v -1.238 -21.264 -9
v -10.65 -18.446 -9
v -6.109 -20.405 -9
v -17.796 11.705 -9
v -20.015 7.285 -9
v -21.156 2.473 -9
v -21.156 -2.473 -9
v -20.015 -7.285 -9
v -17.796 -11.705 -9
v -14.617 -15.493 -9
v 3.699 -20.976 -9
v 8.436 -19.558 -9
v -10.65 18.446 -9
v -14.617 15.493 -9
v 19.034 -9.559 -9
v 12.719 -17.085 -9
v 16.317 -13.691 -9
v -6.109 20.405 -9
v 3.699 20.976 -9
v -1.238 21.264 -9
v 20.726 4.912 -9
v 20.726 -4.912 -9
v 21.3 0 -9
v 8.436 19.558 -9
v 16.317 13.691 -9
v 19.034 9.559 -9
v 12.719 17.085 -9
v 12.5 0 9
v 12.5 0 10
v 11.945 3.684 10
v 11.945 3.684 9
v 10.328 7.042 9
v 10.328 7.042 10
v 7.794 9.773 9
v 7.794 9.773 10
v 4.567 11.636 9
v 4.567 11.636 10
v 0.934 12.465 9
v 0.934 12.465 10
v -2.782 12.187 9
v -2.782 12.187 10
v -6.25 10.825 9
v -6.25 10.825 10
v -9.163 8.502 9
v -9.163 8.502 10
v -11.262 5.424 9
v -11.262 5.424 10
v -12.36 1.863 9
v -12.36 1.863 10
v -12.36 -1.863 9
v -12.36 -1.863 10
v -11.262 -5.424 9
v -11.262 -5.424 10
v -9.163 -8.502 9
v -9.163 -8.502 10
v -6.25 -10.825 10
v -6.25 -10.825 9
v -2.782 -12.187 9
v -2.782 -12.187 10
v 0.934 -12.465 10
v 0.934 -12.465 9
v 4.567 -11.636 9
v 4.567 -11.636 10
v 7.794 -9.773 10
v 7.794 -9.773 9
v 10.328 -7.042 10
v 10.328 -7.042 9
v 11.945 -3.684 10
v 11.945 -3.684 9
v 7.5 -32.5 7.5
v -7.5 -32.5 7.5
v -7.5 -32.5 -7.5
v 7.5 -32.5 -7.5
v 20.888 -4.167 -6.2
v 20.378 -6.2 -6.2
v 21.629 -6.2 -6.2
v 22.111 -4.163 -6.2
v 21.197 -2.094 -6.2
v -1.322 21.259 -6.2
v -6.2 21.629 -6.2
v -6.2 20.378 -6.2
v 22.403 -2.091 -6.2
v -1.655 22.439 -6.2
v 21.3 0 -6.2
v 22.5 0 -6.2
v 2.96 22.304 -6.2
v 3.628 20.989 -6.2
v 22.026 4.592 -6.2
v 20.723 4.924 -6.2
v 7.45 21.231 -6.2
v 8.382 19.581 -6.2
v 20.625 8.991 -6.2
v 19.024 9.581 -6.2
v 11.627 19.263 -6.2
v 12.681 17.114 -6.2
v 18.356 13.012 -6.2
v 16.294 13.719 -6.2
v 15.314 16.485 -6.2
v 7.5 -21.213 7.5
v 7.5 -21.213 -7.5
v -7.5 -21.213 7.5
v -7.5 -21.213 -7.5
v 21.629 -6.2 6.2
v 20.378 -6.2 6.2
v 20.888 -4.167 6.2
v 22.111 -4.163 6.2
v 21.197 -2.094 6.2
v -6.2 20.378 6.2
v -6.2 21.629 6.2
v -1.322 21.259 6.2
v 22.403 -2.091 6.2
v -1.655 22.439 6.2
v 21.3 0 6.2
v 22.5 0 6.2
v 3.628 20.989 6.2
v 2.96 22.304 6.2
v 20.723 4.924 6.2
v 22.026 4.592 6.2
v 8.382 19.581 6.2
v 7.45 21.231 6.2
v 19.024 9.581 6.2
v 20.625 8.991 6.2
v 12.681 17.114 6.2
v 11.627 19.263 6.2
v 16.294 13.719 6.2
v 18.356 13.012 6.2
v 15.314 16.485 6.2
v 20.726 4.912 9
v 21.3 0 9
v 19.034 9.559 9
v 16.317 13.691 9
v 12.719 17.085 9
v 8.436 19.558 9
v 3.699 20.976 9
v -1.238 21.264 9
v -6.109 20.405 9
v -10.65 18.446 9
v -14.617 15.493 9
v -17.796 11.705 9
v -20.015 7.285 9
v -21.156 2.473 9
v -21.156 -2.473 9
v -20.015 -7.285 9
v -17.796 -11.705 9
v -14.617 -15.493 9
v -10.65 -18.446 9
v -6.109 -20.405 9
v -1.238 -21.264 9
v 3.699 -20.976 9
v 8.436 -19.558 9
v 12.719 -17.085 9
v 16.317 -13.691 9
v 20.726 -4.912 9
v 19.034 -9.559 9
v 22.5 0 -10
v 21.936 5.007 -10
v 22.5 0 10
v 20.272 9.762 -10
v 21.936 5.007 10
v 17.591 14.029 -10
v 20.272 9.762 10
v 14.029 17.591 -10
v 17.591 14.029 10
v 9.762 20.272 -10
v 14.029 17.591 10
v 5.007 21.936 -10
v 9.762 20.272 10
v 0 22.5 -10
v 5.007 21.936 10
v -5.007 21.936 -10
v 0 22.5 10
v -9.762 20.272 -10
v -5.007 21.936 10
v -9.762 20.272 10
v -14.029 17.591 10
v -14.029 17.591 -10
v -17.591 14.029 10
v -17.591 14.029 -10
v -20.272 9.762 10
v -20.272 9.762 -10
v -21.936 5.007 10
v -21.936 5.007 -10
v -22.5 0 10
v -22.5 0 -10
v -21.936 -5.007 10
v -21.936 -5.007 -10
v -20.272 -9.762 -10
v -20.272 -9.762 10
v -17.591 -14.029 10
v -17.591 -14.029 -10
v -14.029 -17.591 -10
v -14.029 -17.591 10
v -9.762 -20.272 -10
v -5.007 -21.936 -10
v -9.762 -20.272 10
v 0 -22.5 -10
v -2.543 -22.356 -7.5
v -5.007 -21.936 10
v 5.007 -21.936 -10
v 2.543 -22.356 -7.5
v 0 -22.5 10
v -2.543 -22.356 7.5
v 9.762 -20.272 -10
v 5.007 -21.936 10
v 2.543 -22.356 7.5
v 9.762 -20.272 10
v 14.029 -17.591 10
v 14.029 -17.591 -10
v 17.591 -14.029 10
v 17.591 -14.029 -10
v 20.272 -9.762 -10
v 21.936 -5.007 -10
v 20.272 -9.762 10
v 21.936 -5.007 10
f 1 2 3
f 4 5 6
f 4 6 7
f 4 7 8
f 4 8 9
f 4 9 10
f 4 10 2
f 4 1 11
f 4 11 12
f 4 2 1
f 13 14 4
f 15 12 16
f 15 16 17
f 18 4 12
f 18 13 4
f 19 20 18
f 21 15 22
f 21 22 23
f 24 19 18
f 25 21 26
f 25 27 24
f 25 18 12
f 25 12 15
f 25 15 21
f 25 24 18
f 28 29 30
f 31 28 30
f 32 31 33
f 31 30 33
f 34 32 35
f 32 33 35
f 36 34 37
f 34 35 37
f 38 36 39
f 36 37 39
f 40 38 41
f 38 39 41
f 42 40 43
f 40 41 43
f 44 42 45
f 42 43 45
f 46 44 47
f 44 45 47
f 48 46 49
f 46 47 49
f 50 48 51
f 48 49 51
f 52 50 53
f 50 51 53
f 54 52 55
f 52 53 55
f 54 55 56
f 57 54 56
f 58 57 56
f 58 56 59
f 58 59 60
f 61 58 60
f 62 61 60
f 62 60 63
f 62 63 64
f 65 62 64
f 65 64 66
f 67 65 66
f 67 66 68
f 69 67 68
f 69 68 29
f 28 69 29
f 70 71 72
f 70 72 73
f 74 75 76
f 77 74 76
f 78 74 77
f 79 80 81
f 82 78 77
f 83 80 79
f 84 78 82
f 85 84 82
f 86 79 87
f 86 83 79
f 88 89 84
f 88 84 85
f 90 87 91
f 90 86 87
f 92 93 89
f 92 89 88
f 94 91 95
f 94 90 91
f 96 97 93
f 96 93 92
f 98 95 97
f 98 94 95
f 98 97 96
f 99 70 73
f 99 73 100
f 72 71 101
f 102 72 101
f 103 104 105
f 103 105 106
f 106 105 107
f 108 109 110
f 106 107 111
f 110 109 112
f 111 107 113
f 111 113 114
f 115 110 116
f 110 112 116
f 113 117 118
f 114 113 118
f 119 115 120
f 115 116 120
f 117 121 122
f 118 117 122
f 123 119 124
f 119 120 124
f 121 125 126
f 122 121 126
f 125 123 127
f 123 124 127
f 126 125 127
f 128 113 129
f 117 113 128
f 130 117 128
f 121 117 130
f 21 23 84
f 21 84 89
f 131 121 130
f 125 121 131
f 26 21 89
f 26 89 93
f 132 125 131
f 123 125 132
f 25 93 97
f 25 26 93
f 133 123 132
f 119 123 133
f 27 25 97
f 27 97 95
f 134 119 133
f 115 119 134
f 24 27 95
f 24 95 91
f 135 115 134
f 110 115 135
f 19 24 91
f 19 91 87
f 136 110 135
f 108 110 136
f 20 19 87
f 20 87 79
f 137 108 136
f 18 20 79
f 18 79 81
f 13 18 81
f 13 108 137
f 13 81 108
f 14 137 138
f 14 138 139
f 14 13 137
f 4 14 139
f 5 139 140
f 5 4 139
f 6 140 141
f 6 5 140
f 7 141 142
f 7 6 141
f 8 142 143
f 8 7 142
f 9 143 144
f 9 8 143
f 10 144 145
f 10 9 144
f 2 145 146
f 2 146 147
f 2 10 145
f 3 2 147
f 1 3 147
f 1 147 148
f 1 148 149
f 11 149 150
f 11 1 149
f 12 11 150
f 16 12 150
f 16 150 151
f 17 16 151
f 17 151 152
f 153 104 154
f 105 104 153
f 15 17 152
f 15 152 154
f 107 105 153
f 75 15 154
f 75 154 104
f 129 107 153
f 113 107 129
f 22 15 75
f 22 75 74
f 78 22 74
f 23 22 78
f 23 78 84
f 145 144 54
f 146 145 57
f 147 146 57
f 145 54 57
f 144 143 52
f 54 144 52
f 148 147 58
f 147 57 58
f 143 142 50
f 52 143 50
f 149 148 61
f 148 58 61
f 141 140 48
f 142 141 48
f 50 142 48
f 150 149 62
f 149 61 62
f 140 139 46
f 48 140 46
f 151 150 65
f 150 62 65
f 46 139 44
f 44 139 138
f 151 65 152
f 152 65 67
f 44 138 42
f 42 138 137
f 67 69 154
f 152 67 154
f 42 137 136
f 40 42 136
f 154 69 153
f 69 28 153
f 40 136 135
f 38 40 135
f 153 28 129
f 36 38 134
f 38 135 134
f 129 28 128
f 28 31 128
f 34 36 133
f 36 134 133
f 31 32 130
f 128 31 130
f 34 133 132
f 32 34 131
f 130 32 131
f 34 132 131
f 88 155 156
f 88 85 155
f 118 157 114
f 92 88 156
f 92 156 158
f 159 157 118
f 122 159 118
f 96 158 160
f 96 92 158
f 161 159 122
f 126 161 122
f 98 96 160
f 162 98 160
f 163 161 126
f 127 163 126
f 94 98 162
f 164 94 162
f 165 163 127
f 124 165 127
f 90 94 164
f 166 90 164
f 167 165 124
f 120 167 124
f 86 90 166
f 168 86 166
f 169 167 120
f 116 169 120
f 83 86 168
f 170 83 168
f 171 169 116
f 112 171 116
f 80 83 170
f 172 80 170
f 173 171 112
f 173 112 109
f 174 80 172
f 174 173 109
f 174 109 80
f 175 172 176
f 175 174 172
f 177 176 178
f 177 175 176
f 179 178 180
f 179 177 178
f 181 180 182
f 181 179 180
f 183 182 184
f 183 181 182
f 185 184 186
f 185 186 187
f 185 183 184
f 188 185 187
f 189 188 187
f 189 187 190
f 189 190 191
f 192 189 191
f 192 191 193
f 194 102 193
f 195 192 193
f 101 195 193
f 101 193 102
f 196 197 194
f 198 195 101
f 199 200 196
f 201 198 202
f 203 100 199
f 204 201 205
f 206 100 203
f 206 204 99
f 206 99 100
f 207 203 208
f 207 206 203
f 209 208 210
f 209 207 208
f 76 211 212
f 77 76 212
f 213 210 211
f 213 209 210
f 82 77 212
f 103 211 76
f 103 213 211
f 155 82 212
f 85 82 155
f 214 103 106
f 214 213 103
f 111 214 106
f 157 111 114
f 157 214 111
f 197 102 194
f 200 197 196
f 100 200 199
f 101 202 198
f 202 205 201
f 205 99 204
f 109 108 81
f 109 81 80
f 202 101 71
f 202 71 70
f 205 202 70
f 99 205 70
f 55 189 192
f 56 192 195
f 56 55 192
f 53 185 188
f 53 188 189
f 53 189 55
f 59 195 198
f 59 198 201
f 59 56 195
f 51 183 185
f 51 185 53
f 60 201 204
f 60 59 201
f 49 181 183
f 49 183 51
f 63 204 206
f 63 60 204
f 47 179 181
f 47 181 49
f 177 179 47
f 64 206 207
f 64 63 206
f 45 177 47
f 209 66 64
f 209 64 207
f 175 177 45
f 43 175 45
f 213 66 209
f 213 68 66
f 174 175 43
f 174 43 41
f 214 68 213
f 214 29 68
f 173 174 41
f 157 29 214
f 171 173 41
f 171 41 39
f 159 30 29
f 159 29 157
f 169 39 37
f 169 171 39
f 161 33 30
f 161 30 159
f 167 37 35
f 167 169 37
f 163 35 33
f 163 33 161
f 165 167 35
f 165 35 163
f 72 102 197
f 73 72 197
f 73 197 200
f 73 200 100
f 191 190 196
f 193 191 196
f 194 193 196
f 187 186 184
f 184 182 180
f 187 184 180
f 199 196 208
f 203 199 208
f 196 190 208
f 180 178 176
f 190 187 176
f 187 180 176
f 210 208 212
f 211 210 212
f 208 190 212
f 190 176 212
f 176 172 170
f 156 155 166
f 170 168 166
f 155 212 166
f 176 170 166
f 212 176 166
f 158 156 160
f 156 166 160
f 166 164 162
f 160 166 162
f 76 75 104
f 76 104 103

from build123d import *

# Parameters (mm, degrees)
F0_R          = 22.5
F1_DEPTH      = 10
F1_DEPTH_BACK = 10
F2_W          = 15
F2_H          = 20
F3_DEPTH      = 7.5
F3_DEPTH_BACK = 7.5
F4_R          = 21.3
F5_DEPTH      = 9
F5_DEPTH_BACK = 9
F6_R          = 12.5
F7_DEPTH      = 3
F8_W          = 12.4
F8_H          = 25.2830533619
F8_W_2        = 28.802598262
F8_H_2        = 12.4
F9_DEPTH      = 6.2
F9_DEPTH_BACK = 6.2


with BuildPart() as f1:
    # F0 (on Top) → F1 (new body, two sides)
    with BuildSketch(Plane.XY) as f1_sk:
        Circle(F0_R)
    extrude(amount=F1_DEPTH)
    extrude(f1_sk.sketch, amount=-F1_DEPTH_BACK)

    # F2 (on Top) → F3 (join, two sides)
    with BuildSketch(Plane.XY) as f3_sk:
        with Locations((0, -22.5)):
            Rectangle(F2_W, F2_H)
    extrude(amount=F3_DEPTH)
    extrude(f3_sk.sketch, amount=-F3_DEPTH_BACK)

    # F4 (on Top) → F5 (cut, two sides)
    with BuildSketch(Plane.XY) as f5_sk:
        Circle(F4_R)
    extrude(amount=-F5_DEPTH, mode=Mode.SUBTRACT)
    extrude(f5_sk.sketch, amount=F5_DEPTH_BACK, mode=Mode.SUBTRACT)

    # F6 (on face) → F7 (cut)
    with BuildSketch(Plane.XY.offset(10)):
        Circle(F6_R)
    extrude(amount=-F7_DEPTH, mode=Mode.SUBTRACT)

    # F8 (on Top) → F9 (cut, two sides)
    with BuildSketch(Plane.XY) as f9_sk:
        with Locations((0, 18.841526681)):
            Rectangle(F8_W, F8_H)
        Polygon((6.2, 31.4830533619), (6.2, 6.2), (35.002598262, 6.2), align=None)
        with Locations((20.601299131, 0)):
            Rectangle(F8_W_2, F8_H_2)
    extrude(amount=-F9_DEPTH, mode=Mode.SUBTRACT)
    extrude(f9_sk.sketch, amount=F9_DEPTH_BACK, mode=Mode.SUBTRACT)


solid = f1.part
